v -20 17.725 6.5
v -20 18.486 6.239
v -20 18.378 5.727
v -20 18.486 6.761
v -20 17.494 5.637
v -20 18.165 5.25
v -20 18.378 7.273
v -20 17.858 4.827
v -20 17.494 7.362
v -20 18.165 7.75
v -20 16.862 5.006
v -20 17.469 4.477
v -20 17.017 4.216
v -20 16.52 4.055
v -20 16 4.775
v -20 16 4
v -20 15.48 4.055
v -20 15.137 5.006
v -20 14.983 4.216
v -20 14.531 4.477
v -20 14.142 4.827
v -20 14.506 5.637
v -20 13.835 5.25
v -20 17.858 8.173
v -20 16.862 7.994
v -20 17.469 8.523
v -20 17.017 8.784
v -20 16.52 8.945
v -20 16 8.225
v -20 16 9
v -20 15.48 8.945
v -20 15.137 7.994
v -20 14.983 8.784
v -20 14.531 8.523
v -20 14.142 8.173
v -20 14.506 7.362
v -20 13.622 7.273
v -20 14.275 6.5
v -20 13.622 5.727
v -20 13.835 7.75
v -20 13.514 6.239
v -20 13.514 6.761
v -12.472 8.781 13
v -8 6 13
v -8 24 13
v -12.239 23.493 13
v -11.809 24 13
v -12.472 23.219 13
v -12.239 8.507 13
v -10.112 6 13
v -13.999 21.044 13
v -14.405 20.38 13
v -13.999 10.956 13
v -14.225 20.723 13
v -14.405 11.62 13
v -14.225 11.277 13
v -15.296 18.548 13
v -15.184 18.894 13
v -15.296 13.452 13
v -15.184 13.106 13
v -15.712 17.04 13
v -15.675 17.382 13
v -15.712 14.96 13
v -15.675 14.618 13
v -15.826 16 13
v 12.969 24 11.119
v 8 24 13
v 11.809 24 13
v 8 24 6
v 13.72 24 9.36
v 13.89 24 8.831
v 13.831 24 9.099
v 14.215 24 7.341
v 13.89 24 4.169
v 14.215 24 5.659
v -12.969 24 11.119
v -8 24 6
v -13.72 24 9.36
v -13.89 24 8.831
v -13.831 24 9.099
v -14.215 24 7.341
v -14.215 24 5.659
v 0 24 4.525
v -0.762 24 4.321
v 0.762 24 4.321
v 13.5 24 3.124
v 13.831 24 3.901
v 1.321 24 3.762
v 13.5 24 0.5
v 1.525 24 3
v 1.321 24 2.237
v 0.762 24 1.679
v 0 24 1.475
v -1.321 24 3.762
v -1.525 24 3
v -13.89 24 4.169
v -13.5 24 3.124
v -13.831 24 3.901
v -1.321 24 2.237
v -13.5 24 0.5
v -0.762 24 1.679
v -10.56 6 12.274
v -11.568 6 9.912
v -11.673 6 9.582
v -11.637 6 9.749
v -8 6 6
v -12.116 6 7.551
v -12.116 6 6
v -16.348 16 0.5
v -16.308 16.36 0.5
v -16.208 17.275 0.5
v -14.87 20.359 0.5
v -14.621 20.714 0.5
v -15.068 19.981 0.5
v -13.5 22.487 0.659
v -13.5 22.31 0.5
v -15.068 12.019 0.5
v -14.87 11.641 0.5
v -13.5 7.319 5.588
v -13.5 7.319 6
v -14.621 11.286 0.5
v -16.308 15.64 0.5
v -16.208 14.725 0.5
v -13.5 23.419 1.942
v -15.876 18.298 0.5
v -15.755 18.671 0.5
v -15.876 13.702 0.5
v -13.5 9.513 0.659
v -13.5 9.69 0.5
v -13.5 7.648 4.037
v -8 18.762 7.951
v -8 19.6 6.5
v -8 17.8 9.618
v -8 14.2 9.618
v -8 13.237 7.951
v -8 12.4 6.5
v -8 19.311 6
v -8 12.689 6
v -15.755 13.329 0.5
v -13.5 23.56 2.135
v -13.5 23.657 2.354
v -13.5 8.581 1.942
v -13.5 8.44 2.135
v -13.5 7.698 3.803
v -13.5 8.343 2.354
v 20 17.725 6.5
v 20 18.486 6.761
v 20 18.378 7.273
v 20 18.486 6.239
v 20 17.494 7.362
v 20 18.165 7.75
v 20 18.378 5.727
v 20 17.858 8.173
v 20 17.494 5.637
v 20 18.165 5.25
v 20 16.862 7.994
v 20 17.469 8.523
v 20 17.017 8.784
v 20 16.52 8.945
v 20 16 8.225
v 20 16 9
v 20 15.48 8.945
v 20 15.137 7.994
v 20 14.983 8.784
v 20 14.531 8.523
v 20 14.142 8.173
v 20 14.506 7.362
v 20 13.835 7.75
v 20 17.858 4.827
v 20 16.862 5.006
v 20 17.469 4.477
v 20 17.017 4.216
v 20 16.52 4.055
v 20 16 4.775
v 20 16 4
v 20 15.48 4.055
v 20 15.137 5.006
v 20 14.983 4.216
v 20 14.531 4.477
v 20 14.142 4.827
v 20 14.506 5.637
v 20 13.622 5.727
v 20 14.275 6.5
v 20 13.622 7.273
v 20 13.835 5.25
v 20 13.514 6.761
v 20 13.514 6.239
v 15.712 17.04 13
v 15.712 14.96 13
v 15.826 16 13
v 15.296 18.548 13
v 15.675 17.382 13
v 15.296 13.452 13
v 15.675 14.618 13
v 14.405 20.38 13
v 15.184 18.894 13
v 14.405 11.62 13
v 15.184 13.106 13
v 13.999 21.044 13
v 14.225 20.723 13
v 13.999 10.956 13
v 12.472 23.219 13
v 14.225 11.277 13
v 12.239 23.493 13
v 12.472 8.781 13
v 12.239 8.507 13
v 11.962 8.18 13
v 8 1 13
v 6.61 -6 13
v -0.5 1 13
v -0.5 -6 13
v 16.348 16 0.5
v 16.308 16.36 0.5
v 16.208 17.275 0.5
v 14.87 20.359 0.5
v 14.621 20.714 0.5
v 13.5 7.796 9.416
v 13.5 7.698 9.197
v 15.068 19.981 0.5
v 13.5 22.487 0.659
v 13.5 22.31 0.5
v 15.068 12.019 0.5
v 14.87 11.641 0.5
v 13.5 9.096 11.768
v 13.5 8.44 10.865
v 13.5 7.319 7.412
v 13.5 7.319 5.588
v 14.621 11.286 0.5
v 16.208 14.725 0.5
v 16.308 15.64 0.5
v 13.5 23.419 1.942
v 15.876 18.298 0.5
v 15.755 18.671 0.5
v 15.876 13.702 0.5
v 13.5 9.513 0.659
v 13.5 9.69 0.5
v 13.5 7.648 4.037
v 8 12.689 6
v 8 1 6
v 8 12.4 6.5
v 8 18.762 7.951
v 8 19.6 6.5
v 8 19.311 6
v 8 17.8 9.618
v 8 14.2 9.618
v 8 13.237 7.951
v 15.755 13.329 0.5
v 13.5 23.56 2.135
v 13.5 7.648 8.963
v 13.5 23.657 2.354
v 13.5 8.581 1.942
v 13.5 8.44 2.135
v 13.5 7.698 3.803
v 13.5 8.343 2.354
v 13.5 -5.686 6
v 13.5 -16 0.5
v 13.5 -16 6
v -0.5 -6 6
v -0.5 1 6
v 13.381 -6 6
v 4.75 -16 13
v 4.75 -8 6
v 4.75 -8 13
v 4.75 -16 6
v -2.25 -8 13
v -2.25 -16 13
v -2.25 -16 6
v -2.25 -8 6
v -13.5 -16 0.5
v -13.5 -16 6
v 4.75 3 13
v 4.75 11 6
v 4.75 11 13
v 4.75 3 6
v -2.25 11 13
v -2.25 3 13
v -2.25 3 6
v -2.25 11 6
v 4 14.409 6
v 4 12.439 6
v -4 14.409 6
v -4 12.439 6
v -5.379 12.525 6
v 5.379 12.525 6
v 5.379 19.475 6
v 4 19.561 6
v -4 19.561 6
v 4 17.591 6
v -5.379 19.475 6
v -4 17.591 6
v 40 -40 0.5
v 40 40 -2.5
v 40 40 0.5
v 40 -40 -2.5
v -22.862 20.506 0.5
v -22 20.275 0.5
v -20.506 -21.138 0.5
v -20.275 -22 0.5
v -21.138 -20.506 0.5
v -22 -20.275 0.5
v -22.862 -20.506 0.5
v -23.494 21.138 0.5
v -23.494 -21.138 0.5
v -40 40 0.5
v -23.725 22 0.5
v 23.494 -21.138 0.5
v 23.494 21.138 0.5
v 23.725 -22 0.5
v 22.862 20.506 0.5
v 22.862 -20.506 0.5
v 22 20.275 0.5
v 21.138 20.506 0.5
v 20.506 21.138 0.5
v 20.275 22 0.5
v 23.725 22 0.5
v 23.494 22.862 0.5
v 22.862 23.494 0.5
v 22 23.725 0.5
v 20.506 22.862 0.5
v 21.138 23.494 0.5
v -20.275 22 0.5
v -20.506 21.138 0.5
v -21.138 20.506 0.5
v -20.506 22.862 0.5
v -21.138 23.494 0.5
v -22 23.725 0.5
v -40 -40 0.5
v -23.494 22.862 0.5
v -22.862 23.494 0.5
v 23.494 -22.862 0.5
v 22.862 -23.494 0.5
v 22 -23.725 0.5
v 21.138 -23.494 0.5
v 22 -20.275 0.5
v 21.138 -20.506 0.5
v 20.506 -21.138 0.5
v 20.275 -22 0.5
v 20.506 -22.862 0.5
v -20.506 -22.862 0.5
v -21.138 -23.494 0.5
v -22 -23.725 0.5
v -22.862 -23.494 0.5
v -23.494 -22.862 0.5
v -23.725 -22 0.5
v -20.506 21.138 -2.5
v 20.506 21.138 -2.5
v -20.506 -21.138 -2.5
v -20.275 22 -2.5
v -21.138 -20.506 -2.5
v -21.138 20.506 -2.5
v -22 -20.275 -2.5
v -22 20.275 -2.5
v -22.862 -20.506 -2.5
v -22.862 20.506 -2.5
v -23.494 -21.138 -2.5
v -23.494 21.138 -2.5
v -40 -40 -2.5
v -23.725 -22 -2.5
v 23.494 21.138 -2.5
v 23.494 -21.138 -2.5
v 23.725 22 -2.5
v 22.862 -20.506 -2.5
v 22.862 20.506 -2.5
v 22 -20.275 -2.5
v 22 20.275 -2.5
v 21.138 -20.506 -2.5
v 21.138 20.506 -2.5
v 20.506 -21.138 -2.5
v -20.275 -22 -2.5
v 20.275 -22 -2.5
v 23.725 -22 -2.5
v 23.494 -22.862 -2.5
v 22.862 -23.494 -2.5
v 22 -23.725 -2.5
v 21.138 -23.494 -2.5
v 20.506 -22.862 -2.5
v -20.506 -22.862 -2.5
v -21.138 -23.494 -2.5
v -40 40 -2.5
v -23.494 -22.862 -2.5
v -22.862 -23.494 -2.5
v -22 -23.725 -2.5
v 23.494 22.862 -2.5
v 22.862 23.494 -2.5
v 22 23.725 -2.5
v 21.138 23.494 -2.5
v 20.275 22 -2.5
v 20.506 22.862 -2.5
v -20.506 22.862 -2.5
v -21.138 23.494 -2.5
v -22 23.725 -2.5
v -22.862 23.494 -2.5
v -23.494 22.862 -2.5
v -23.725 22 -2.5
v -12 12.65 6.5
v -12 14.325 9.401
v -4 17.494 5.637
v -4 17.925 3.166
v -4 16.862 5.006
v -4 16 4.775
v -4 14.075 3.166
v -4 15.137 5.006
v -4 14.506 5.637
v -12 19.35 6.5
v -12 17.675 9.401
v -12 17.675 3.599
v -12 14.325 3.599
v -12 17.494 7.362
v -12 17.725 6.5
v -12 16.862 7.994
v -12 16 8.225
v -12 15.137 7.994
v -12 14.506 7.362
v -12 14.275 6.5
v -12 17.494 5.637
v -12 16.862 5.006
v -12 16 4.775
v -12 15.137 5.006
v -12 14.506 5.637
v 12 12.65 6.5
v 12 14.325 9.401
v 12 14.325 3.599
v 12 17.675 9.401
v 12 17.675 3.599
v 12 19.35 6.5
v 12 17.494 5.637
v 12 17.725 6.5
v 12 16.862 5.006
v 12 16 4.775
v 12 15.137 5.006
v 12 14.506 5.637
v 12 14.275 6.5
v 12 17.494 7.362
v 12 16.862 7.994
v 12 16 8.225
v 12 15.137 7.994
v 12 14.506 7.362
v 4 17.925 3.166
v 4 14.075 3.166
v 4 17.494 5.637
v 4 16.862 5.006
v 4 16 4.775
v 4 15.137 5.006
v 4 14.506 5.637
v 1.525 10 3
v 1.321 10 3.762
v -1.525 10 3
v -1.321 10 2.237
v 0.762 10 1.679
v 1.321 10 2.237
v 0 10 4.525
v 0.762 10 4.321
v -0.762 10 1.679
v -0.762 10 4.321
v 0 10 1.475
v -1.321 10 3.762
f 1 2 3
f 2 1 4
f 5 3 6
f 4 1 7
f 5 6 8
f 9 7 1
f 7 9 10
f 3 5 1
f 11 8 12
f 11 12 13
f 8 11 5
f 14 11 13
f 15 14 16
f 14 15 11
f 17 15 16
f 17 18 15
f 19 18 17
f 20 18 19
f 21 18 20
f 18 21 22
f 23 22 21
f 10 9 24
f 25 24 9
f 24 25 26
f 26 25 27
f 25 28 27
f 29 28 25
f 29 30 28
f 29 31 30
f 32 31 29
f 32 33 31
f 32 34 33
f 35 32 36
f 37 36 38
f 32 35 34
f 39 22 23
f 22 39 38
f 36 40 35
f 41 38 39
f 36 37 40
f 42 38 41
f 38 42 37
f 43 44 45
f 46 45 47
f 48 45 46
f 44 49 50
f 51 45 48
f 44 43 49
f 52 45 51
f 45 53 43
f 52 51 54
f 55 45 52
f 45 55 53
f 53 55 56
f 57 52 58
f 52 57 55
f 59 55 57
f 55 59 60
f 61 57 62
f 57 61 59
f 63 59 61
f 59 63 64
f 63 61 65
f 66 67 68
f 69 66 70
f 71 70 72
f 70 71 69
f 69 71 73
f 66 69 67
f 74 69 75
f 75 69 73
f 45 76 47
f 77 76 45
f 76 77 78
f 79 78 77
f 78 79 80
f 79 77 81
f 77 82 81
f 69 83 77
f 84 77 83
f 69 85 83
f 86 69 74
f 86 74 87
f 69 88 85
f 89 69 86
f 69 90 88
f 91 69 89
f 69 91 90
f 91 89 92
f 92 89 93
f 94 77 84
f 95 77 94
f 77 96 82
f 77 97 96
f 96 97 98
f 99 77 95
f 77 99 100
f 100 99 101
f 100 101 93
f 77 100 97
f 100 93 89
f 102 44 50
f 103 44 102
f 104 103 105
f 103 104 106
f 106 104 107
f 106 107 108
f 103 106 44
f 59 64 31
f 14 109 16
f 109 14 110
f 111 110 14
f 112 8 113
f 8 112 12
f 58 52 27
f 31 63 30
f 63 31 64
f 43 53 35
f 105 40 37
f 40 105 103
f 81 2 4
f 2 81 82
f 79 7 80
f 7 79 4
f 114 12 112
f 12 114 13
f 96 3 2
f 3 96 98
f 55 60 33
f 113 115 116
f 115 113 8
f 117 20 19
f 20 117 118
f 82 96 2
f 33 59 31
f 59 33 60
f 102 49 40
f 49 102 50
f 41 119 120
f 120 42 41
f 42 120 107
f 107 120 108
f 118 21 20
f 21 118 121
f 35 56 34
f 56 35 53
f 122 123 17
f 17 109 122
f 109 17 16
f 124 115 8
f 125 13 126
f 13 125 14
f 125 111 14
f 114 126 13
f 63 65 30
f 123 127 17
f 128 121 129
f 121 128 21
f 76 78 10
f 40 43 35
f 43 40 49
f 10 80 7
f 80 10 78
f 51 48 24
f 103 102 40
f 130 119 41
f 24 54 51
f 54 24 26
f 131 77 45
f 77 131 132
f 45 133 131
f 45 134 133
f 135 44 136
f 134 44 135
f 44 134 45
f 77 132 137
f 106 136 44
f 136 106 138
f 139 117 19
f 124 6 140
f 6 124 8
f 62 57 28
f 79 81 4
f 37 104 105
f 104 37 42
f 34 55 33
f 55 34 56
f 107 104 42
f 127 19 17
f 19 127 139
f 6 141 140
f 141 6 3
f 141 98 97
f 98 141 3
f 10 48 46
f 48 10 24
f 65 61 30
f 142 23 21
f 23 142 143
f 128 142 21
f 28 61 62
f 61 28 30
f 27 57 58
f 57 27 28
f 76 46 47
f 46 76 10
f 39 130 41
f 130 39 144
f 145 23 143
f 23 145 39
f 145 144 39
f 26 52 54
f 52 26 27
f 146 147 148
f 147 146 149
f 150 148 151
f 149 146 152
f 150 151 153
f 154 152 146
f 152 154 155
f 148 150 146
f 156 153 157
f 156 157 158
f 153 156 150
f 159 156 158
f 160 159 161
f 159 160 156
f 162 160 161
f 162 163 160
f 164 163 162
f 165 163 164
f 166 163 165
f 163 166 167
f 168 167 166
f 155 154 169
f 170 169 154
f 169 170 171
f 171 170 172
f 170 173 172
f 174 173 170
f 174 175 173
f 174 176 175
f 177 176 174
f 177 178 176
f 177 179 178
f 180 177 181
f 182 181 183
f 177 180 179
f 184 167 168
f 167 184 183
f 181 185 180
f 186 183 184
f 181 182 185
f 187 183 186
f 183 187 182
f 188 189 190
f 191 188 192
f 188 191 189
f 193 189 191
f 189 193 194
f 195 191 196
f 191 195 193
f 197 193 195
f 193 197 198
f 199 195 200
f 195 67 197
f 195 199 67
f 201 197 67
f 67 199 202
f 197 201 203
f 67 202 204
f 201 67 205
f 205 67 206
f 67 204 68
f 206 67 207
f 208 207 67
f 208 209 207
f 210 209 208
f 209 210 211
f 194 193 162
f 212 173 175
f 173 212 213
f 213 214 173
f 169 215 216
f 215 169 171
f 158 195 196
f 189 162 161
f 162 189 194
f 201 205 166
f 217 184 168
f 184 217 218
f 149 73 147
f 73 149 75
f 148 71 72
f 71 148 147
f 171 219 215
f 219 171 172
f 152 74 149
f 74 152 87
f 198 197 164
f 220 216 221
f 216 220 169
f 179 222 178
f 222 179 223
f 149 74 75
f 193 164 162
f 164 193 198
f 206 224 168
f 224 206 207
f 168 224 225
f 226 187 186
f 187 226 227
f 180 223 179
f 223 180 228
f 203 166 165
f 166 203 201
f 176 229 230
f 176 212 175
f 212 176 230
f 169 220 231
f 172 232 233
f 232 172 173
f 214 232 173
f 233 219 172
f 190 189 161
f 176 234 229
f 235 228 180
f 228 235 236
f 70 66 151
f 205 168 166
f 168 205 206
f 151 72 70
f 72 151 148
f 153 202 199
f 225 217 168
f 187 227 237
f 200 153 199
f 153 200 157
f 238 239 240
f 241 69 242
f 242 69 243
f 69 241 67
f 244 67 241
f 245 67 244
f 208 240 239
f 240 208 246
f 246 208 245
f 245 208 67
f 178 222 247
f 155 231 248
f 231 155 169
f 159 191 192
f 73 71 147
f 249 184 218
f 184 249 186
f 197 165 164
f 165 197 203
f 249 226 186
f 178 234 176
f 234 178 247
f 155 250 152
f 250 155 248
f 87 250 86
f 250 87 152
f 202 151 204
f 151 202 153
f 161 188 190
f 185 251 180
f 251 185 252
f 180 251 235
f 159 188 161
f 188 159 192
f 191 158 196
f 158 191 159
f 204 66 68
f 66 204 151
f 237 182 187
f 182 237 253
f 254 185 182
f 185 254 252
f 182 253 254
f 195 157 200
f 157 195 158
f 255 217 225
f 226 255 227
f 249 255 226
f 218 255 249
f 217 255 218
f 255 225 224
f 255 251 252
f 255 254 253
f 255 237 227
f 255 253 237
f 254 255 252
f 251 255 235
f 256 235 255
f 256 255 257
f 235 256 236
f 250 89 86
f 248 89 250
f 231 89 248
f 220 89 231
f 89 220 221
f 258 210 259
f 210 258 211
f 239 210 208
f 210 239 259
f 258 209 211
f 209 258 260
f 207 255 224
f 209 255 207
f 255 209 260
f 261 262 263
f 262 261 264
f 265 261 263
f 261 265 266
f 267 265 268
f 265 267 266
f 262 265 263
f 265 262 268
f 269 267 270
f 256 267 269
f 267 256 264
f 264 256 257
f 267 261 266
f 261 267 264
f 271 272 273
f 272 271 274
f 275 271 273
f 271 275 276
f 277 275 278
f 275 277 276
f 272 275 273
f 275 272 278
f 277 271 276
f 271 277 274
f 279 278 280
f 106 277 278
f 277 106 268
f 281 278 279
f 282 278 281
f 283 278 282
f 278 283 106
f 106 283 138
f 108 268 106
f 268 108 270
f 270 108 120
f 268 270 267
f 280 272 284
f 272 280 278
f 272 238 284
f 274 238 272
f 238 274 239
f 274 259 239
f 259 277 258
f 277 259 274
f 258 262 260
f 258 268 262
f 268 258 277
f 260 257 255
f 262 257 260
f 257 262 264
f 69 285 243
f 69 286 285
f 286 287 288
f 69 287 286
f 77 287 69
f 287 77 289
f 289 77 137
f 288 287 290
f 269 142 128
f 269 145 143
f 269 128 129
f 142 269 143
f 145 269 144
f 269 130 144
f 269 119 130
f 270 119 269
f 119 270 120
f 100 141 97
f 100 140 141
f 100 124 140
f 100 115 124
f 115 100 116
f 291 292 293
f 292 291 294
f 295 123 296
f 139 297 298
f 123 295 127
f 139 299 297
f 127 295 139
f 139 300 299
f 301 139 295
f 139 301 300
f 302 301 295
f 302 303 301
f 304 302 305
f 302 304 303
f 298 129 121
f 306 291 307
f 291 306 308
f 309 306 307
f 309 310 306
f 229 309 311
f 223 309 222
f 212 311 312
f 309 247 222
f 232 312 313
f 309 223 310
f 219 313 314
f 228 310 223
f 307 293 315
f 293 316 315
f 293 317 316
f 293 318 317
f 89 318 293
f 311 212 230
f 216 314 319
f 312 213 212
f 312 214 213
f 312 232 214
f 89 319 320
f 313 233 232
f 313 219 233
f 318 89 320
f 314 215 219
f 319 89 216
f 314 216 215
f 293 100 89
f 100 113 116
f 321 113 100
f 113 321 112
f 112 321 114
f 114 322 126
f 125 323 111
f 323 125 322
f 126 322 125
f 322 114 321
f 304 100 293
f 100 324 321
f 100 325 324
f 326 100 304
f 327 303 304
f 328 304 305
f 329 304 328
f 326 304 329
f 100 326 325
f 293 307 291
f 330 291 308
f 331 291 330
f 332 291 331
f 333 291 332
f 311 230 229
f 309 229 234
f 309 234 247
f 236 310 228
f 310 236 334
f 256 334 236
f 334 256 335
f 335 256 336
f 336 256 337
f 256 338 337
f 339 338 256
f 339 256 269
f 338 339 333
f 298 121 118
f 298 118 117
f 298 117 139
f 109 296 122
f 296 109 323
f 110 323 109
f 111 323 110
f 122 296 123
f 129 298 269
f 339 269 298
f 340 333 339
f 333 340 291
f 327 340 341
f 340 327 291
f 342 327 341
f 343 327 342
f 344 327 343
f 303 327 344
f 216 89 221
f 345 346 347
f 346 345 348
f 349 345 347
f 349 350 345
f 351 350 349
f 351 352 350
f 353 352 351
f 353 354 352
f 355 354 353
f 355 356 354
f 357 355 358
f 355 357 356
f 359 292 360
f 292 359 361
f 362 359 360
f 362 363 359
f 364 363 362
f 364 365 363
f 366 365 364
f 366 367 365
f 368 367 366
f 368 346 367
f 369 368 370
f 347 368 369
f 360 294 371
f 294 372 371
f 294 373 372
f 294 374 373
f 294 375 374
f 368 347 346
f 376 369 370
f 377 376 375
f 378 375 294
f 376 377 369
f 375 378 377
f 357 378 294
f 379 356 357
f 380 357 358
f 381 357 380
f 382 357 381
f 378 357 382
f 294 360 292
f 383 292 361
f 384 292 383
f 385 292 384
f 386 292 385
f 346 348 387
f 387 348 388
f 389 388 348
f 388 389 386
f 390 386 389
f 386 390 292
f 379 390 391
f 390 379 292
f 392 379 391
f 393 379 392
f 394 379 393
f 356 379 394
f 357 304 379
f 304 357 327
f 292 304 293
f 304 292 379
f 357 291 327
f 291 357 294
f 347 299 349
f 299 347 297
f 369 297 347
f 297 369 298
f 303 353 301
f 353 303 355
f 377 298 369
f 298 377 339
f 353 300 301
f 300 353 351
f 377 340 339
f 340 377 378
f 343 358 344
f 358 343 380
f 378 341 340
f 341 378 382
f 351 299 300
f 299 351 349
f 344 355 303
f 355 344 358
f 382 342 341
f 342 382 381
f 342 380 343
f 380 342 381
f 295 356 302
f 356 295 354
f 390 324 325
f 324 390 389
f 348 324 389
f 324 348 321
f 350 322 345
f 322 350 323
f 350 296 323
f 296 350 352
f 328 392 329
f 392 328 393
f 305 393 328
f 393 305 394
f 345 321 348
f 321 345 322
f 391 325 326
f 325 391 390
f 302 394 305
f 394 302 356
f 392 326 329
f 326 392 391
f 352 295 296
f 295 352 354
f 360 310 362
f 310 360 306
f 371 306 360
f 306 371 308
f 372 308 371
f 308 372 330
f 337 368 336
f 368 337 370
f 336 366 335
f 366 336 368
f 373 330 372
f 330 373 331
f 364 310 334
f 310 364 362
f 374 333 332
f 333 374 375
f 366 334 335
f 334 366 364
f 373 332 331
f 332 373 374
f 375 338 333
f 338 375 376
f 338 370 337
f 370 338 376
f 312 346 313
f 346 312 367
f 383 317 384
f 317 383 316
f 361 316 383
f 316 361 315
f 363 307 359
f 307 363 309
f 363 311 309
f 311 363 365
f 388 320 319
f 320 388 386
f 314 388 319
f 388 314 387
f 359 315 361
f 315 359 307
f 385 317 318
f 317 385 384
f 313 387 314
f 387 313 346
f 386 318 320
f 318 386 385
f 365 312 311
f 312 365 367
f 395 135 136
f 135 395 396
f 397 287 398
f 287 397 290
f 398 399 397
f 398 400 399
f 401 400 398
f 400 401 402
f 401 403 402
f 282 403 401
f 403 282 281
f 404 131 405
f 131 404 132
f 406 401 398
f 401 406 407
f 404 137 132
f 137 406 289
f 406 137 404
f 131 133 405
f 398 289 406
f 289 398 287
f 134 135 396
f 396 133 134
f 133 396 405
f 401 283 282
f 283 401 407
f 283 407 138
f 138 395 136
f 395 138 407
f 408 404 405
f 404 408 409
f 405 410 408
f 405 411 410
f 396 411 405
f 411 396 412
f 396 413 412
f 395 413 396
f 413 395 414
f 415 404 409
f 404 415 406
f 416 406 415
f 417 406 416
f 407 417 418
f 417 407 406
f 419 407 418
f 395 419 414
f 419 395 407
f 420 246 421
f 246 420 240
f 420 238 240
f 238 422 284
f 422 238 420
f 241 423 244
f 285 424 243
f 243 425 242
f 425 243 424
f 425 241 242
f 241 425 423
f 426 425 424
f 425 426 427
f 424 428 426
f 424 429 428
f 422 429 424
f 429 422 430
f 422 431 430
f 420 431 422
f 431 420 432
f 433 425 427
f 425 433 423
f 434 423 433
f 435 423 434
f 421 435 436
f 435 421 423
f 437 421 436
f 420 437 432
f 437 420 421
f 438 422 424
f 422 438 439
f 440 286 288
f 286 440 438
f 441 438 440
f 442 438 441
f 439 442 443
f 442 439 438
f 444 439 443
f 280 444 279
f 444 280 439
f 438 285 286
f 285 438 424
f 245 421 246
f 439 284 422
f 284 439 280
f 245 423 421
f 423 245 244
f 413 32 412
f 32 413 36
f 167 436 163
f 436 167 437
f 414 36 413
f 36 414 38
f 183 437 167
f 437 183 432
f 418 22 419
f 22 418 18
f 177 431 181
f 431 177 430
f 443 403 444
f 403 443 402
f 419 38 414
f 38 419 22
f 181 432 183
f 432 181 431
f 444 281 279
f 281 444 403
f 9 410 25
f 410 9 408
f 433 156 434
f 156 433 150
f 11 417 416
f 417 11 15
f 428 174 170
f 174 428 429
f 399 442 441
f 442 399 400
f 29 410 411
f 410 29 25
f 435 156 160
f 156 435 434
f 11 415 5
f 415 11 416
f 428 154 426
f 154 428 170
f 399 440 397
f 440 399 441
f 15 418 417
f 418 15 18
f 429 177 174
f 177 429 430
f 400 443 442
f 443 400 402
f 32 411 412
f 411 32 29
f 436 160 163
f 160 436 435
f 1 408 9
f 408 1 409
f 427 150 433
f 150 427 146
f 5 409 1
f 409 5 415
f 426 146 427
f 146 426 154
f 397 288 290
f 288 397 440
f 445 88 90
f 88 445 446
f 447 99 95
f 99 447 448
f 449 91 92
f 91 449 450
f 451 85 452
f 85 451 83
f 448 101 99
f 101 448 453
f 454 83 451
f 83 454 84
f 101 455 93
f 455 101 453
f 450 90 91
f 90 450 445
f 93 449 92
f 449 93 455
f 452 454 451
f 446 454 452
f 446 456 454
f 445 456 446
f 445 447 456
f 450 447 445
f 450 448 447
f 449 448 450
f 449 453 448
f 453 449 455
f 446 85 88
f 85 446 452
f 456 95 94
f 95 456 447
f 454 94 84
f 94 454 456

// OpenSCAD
// file: configuration.scad
// Increase this if your slicer or printer make holes too tight.
extra_radius = 0.1;

// OD = outside diameter, corner to corner.
m3_nut_od = 6.1;
m3_nut_radius = m3_nut_od/2 + 0.2 + extra_radius;

// Major diameter of metric 3mm thread.
m3_major = 2.85;
m3_radius = m3_major/2 + extra_radius;
m3_wide_radius = m3_major/2 + extra_radius + 0.2;

// OD = outside diameter, corner to corner.
m5_nut_od = 8.1;
m5_nut_radius = m5_nut_od/2 + 0.2 + extra_radius;

// Major diameter of metric 5mm thread.
m5_major = 4.85;
m5_radius = m5_major/2 + extra_radius;
m5_wide_radius = m5_major/2 + extra_radius + 0.2;

// NEMA17 stepper motors.
motor_shaft_diameter = 5;
motor_shaft_radius = motor_shaft_diameter/2 + extra_radius;

// Frame brackets. M3x8mm screws work best with 3.6 mm brackets.
thickness = 3.6;

// OpenBeam or Misumi. Currently only 15x15 mm, but there is a plan
// to make models more parametric and allow 20x20 mm in the future.
extrusion = 15;
// main file
include <configuration.scad>;

separation = 40;
thickness = 6;

horn_thickness = 13;
horn_x = 8;

belt_width = 5;
belt_x = 5.6;
belt_z = 7;

module carriage() {
  // Timing belt (up and down).
  translate([-belt_x, 0, belt_z + belt_width/2]) %
    cube([1.7, 100, belt_width], center=true);
  translate([belt_x, 0, belt_z + belt_width/2]) %
    cube([1.7, 100, belt_width], center=true);
  difference() {
    union() {
      // Main body.
      translate([0, 4, thickness/2])
      cube([27, 40, thickness], center=true);
      // Extend a area to join with openbeam plate
      translate([0, 0, 0 - (thickness / 2) + 2])
      cube([80,80, thickness / 2], center=true);
      // Ball joint mount horns.
      for (x = [-1, 1]) {
        scale([x, 1, 1]) intersection() {
          translate([0, 15, horn_thickness/2])
            cube([separation, 18, horn_thickness], center=true);
          translate([horn_x, 16, horn_thickness/2]) rotate([0, 90, 0])
            cylinder(r1=14, r2=2.5, h=separation/2-horn_x);
        }
      }
      // Belt clamps.
      difference() {
        union() {
          translate([6.5, -2.5, horn_thickness/2+1])
            cube([14, 7, horn_thickness-2], center=true);
          translate([10.75, 2.5, horn_thickness/2+1])
            cube([5.5, 16, horn_thickness-2], center=true);
        }
        // Avoid touching diagonal push rods (carbon tube).
        translate([20, -10, 12.5]) rotate([35, 35, 30])
          cube([40, 40, 20], center=true);
      }
      for (y = [-12, 7]) {
        translate([1.25, y, horn_thickness/2+1])
          cube([7, 8, horn_thickness-2], center=true);
      }
    }
 
   // Screws for gantry plate.
    for (x = [-22, +22]) {
      for (y = [-22, +22 ]) {
        translate([x, y, thickness]) #
          cylinder(r=m3_wide_radius, h=30, center=true, $fn=12);
      }
    }

    // Screws for ball joints.
    translate([0, 16, horn_thickness/2]) rotate([0, 90, 0]) #
      cylinder(r=m3_wide_radius, h=60, center=true, $fn=12);
    // Lock nuts for ball joints.
    for (x = [-1, 1]) {
      scale([x, 1, 1]) intersection() {
        translate([horn_x, 16, horn_thickness/2]) rotate([90, 0, -90])
          cylinder(r1=m3_nut_radius, r2=m3_nut_radius+0.5, h=8,
                   center=true, $fn=6);
      }
    }
        // Vertical calibration screw.
    translate([0, 30, thickness/2]) rotate([90, 0, 0]) #
      cylinder(r=m3_radius, h=20, $fn=12);
  }
}

carriage();
